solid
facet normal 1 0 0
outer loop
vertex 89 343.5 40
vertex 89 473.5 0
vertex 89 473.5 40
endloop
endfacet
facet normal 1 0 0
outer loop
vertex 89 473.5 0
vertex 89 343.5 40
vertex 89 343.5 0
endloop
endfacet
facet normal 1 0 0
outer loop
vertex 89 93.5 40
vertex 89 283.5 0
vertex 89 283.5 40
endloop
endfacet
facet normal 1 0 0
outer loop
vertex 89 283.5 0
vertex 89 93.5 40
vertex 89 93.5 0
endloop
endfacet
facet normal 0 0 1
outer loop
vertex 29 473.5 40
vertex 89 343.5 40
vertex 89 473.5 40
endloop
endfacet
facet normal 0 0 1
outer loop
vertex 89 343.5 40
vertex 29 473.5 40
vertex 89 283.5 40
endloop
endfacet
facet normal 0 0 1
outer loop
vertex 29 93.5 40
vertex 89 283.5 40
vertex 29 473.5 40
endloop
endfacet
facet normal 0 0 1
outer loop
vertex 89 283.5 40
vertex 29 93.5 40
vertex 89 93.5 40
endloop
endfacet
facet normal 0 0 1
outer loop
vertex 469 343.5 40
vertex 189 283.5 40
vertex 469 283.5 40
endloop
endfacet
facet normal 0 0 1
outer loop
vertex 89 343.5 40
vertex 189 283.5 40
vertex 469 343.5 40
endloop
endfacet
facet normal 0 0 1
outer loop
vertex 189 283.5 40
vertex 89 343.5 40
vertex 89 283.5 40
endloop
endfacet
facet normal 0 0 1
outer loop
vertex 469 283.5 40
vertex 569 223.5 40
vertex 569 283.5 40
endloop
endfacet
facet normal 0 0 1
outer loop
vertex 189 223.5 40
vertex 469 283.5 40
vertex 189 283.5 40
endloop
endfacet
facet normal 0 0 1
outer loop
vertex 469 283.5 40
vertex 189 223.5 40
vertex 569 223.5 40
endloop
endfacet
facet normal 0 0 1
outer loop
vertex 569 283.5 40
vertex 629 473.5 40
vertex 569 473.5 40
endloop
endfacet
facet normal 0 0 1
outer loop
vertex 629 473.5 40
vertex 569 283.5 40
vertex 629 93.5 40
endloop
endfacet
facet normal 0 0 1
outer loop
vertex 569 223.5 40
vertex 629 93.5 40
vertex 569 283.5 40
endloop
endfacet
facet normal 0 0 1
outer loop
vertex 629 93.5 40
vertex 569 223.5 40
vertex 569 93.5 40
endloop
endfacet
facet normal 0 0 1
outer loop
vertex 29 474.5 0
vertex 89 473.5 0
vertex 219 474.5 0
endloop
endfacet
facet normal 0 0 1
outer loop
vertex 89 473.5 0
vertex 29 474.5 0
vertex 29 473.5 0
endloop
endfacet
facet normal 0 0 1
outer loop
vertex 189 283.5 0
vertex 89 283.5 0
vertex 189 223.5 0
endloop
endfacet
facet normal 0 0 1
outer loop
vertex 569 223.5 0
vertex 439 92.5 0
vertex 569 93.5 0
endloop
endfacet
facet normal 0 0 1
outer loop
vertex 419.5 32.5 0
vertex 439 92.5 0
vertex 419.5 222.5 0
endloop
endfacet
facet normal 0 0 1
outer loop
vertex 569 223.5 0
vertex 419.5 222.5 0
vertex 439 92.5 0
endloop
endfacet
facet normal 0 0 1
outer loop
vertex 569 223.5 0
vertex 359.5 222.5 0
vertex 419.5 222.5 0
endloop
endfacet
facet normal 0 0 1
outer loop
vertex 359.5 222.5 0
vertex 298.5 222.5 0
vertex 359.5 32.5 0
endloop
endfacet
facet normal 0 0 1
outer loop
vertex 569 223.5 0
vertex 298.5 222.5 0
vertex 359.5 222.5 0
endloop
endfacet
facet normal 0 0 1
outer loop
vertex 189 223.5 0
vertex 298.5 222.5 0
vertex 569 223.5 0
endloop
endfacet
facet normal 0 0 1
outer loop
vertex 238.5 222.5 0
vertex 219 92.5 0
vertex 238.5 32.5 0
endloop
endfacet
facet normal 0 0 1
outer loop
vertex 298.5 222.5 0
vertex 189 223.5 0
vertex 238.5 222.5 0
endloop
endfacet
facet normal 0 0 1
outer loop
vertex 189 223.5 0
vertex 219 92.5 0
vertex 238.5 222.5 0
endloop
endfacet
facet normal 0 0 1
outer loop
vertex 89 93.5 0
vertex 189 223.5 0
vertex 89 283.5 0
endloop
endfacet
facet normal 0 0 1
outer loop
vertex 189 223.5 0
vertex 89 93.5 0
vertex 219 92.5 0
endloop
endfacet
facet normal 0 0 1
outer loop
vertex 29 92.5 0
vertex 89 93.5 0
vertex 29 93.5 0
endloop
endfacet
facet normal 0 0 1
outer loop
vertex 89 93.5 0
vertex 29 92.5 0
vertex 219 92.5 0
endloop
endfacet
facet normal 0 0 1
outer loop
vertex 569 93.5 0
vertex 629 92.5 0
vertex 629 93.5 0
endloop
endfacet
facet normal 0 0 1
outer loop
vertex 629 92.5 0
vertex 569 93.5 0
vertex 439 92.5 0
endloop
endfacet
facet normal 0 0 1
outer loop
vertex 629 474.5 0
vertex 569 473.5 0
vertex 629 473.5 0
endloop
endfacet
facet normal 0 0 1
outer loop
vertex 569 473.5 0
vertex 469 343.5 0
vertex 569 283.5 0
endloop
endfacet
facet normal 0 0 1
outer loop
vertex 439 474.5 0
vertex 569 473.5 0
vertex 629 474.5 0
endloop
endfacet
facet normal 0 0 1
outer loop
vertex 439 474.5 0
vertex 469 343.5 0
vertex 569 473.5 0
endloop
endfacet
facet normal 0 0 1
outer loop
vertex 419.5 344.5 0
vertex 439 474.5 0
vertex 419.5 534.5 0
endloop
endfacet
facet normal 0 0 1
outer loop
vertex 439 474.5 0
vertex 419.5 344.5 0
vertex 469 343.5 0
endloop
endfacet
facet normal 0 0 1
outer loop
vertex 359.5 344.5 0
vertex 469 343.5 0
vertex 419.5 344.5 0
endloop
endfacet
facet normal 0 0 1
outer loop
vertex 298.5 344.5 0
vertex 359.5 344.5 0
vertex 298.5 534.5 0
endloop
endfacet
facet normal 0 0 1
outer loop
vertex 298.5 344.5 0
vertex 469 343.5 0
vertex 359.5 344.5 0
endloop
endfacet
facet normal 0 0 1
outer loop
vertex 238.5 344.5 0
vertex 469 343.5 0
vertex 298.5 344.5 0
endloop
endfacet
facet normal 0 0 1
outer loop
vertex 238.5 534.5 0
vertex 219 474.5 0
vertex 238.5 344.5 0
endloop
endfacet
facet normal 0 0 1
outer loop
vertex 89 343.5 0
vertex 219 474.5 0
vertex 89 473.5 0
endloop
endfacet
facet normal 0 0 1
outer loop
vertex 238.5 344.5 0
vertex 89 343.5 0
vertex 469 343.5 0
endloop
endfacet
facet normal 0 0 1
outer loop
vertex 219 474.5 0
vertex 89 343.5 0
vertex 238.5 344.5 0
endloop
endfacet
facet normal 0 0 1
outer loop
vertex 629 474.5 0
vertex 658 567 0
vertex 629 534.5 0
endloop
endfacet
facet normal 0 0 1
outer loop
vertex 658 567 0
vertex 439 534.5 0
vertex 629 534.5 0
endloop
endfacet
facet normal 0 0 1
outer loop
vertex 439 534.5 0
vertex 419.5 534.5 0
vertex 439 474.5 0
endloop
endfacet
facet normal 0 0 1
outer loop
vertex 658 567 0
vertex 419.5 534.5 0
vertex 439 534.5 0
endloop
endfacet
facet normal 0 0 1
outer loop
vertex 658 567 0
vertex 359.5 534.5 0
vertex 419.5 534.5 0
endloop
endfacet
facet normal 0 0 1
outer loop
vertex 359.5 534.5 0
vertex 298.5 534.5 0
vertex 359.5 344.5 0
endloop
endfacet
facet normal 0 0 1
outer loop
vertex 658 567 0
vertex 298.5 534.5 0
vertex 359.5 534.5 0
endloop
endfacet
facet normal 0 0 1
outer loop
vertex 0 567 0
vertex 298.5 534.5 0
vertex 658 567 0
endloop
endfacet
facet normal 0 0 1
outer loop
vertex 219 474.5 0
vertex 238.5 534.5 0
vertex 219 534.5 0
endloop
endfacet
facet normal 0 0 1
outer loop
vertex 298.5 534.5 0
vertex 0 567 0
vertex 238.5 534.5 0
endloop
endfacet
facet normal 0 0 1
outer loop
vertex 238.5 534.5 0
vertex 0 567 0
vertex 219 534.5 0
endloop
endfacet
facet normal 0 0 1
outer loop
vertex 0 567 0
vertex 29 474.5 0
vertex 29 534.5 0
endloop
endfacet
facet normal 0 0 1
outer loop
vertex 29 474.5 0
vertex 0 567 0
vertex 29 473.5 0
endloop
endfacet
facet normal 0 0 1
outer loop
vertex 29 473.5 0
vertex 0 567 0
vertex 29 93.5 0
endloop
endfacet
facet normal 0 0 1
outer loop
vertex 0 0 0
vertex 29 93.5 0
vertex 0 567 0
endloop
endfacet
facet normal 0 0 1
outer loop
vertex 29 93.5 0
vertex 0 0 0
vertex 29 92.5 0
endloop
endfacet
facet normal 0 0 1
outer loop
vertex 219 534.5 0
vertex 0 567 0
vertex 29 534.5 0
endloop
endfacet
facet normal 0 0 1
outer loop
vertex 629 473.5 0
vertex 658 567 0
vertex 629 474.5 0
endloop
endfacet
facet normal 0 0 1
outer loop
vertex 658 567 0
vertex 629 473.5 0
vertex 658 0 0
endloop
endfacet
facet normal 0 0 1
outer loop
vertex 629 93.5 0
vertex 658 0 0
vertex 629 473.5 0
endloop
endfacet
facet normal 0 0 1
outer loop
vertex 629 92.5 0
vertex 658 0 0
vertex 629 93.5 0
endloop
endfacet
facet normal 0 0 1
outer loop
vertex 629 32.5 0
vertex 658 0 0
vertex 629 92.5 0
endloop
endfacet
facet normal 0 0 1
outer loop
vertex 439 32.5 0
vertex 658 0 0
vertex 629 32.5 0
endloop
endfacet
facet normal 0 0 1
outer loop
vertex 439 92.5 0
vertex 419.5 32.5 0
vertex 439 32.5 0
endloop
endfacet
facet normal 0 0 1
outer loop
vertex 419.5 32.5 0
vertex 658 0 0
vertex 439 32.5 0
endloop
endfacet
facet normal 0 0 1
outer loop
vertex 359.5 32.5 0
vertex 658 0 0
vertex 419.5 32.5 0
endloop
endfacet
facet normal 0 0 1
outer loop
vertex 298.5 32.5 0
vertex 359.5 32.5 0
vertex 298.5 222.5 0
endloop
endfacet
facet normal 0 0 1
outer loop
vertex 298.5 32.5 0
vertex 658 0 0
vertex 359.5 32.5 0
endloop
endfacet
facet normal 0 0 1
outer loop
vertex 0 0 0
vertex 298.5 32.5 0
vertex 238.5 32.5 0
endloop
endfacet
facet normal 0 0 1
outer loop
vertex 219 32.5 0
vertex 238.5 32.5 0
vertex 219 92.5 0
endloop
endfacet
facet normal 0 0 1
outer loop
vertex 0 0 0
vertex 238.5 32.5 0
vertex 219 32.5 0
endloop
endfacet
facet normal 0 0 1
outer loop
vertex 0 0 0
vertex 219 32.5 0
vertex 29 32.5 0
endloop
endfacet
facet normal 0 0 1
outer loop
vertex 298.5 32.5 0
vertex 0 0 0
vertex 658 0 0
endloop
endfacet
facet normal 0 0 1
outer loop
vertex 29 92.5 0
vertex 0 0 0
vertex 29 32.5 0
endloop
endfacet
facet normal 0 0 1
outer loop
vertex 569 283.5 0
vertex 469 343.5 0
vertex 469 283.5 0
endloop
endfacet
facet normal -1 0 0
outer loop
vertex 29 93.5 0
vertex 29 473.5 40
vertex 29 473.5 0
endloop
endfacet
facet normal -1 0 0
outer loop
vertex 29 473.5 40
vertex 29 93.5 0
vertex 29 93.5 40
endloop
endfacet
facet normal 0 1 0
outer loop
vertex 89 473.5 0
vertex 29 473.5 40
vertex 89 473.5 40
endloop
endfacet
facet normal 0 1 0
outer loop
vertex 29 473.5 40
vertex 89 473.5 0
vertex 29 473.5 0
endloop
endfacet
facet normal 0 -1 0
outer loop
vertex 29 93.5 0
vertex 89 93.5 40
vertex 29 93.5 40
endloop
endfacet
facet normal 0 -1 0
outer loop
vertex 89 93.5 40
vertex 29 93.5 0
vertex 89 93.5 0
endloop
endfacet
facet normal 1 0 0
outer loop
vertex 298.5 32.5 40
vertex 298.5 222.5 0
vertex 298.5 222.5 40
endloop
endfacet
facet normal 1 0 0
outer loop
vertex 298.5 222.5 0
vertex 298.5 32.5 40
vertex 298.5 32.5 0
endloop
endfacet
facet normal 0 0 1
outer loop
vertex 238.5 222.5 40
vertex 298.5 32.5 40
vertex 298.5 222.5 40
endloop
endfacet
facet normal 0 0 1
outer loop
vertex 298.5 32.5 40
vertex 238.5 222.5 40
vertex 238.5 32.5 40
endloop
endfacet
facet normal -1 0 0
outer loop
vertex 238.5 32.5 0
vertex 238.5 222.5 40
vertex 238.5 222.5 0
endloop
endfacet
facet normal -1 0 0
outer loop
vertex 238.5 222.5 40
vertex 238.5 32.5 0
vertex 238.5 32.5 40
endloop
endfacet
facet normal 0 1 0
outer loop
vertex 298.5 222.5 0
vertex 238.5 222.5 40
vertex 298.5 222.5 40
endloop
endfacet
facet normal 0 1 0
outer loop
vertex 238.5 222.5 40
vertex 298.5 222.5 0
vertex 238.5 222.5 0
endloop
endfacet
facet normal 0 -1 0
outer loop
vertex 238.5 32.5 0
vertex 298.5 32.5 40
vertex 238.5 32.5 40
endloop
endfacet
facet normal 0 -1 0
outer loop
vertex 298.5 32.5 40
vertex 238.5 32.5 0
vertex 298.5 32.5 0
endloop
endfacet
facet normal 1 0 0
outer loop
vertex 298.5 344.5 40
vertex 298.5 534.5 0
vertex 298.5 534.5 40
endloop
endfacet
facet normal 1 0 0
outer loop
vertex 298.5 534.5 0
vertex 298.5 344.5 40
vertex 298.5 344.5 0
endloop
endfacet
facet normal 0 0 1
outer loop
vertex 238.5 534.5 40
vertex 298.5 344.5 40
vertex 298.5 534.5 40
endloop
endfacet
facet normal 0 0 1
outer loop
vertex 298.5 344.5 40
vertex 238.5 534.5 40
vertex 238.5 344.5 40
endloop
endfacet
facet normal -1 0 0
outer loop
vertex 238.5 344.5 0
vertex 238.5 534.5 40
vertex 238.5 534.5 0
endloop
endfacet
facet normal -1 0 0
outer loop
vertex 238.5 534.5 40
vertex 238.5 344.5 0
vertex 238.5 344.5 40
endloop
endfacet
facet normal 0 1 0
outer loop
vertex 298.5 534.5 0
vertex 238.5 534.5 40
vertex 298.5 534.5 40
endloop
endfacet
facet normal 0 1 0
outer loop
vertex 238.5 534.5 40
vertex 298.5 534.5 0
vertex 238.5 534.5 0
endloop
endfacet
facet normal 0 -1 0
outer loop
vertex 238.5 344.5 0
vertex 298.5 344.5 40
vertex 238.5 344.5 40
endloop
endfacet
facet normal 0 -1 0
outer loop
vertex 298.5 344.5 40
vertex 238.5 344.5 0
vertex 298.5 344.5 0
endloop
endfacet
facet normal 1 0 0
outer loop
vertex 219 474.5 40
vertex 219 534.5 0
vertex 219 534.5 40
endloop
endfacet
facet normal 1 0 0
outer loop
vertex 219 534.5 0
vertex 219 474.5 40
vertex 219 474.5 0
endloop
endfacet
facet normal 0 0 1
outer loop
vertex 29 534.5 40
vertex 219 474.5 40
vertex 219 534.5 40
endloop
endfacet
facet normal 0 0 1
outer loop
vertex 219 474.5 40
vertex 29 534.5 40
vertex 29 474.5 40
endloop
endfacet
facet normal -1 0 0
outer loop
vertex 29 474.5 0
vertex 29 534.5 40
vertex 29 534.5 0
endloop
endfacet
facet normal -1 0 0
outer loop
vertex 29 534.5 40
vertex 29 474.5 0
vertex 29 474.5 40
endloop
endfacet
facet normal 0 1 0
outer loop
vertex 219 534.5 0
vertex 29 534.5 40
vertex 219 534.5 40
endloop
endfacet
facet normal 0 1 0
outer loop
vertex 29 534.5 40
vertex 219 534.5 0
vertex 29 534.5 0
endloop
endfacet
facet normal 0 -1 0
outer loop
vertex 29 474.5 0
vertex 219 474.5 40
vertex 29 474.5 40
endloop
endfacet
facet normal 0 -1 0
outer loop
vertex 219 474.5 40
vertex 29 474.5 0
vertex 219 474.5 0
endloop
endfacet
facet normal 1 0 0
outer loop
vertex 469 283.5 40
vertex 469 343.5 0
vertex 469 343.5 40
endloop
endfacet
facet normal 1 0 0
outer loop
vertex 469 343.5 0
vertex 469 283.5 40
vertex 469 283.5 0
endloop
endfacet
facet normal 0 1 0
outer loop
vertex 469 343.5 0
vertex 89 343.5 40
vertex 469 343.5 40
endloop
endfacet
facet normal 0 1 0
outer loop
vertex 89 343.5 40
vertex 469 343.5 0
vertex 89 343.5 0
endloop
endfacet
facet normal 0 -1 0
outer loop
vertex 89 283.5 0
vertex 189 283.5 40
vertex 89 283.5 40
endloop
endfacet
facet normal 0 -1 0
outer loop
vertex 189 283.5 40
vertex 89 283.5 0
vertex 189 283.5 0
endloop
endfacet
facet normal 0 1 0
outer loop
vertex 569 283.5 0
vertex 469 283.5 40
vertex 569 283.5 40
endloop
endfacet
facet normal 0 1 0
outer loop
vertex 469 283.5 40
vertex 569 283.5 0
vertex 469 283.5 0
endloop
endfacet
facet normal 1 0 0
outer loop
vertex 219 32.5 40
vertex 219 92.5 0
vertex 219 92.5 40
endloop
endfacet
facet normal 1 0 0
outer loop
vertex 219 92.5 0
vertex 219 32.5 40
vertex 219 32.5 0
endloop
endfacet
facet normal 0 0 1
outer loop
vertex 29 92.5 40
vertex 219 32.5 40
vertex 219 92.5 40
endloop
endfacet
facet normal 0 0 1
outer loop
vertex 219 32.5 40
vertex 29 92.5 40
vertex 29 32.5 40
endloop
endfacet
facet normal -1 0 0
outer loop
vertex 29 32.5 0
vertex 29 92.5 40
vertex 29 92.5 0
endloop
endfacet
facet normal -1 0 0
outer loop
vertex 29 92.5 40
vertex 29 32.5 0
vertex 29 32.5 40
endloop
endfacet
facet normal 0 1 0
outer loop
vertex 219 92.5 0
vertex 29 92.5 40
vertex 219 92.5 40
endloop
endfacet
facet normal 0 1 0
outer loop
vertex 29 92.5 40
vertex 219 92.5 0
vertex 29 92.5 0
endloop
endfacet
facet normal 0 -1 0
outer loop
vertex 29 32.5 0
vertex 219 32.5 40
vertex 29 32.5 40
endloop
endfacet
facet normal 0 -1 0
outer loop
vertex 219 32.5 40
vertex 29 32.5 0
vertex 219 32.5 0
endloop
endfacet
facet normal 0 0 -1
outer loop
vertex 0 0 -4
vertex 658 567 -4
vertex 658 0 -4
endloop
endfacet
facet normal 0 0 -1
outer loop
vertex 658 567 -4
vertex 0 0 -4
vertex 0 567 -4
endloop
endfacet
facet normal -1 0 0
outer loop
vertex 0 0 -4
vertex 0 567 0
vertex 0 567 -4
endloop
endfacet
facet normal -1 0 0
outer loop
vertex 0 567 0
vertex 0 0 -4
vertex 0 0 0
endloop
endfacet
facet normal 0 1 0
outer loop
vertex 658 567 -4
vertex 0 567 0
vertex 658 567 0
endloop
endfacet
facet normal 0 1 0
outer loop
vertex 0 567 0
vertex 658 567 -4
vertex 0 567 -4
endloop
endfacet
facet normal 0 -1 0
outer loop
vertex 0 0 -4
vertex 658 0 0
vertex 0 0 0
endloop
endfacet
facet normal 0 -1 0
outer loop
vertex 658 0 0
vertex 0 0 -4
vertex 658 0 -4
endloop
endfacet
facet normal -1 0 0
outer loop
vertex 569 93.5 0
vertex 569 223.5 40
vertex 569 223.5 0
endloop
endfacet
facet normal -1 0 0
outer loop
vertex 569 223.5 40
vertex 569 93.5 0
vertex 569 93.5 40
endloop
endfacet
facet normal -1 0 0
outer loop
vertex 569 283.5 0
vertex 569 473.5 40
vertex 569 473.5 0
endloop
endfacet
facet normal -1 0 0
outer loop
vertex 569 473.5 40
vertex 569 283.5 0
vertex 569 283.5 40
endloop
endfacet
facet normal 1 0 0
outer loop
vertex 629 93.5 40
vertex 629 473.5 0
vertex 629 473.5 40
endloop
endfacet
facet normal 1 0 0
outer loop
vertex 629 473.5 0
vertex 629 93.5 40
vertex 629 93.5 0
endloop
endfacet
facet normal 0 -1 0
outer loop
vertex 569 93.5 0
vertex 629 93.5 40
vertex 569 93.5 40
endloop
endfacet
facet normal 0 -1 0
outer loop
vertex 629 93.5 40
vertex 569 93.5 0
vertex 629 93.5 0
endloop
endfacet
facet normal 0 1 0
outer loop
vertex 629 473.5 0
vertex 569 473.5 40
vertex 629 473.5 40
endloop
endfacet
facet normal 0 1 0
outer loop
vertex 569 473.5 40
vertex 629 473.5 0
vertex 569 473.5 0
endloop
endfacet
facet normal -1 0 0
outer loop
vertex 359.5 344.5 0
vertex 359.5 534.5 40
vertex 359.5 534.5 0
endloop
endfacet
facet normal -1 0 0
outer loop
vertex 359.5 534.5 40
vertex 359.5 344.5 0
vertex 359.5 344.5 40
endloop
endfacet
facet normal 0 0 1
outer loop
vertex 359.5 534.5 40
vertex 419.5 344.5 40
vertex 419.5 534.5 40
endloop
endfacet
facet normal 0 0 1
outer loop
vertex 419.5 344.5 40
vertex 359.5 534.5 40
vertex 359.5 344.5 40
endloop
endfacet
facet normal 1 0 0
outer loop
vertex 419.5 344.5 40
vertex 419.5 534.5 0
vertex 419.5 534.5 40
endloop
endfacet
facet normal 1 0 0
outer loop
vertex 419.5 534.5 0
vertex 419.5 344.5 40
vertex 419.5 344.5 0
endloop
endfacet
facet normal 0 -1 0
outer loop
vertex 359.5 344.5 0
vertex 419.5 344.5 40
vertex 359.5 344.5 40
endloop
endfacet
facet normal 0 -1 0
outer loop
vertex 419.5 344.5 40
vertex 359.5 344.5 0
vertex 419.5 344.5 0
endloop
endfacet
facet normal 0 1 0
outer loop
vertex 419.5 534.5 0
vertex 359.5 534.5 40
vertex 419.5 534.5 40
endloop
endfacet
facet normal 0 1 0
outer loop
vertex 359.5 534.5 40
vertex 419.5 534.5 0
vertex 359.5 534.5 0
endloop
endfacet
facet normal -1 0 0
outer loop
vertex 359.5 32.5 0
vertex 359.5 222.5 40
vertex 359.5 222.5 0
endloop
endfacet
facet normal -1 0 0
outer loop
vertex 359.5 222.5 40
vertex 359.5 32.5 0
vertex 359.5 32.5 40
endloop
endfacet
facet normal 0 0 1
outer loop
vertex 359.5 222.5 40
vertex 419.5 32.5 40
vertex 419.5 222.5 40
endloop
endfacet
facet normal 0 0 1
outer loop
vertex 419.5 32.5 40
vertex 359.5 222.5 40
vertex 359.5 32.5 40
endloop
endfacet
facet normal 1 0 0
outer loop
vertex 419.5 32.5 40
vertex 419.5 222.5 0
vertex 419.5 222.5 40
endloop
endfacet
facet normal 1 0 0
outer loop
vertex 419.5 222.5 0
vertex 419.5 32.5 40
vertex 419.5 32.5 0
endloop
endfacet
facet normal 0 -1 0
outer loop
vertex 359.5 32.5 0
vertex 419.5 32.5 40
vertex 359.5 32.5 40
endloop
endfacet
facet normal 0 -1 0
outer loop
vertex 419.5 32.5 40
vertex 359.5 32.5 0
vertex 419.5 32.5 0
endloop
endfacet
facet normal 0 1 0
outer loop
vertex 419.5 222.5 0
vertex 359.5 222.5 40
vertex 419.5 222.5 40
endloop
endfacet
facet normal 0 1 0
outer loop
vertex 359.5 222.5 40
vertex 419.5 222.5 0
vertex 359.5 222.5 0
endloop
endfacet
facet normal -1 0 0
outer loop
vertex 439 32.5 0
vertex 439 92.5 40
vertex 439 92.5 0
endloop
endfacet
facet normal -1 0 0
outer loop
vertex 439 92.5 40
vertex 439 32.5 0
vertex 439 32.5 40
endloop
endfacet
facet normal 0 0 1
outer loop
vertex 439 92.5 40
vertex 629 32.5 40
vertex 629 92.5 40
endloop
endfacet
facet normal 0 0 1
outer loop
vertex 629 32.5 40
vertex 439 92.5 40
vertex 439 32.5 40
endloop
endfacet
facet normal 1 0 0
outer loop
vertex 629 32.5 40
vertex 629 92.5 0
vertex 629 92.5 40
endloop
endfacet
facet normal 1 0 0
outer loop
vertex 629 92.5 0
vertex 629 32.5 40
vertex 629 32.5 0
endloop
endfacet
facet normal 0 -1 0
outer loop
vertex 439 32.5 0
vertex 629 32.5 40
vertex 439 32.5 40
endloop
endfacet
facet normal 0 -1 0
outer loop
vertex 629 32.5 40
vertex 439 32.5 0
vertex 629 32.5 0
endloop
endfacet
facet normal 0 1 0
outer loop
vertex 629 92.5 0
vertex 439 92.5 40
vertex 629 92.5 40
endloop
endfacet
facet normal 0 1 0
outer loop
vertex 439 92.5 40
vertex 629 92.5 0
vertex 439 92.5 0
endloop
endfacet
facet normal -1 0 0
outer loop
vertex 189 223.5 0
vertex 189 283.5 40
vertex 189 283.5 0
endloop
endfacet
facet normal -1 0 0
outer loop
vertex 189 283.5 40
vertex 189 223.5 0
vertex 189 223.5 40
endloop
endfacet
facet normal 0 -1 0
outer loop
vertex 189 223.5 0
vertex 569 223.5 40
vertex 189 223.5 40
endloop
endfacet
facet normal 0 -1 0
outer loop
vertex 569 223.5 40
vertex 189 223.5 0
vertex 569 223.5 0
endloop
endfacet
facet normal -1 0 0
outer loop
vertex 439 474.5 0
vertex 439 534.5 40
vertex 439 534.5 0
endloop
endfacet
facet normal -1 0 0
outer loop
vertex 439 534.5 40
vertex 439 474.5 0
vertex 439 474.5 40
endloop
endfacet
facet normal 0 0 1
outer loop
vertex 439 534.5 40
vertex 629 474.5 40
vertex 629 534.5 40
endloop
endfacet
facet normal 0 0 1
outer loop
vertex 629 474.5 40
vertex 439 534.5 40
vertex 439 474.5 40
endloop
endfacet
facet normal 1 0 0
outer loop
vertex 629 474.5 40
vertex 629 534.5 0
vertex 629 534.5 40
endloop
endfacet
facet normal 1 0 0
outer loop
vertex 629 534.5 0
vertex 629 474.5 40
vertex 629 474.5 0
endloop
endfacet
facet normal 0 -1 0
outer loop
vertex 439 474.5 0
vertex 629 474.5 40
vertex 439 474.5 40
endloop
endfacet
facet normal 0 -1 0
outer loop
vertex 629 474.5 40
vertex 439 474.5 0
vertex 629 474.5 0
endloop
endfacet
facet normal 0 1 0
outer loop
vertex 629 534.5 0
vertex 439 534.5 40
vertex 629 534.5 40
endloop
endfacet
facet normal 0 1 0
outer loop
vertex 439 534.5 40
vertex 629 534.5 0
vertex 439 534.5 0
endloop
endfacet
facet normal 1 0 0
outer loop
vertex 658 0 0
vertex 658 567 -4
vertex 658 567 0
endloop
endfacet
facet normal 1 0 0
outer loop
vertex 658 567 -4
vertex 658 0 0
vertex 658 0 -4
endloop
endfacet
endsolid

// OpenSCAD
// Schweißtisch geschlossen

vkr_h=40;
vkr_l=380;
vkr_b=60;

p_h=4;
p_l=567;
p_b=329;

clear=1;
dist=0;

module mod() {
    // 1. bar
    color( "Olive", 1.0 ) {
        translate([0.5*vkr_b-clear,(p_l-vkr_l)/2]) {
            cube([vkr_b,vkr_l,vkr_h], 0);
        };
    };

    // 2. bar
    translate([p_b-1.5*vkr_b-.5*clear,(p_l-vkr_l)/2-vkr_b-clear,0]) {
        color( "Lime", 1.0 ) {
            cube([vkr_b,vkr_l/2,vkr_h], 0);
        };
    };
    
    // 2. bar
    translate([p_b-1.5*vkr_b-.5*clear,(p_l/2)+vkr_b+clear,0]) {
        color( "Lime", 1.0 ) {
            cube([vkr_b,vkr_l/2,vkr_h], 0);
        };
    };

    // 3. bar
    translate([0.5*vkr_b-clear,p_l/2+vkr_l/2+clear,0]) {
        color( "Red", 1.0 ) {
            cube([vkr_l/2,vkr_b,vkr_h], 0);
        };
    };
    
    // 4. bar
    translate([1.5*vkr_b-clear,p_l/2,0]) {
        color( "ForestGreen", 1.0 ) {
            cube([vkr_l,vkr_b,vkr_h], 0);
        };
    };
    
    // 5. bar
    translate([0.5*vkr_b-clear*clear,(p_l-vkr_l)/2-vkr_b-clear,0]) {
        color( "Red", 1.0 ) {
            cube([vkr_l/2,vkr_b,vkr_h], 0);
        };
    };

    // Plate
    translate([0,0,-p_h]) {
        cube([p_b,p_l,p_h], 0);
    };
};


mod();

translate([p_b*2+dist,p_l,0]) {
    rotate(a=180, v=[0,0,1]){
        mod();
    };
};
